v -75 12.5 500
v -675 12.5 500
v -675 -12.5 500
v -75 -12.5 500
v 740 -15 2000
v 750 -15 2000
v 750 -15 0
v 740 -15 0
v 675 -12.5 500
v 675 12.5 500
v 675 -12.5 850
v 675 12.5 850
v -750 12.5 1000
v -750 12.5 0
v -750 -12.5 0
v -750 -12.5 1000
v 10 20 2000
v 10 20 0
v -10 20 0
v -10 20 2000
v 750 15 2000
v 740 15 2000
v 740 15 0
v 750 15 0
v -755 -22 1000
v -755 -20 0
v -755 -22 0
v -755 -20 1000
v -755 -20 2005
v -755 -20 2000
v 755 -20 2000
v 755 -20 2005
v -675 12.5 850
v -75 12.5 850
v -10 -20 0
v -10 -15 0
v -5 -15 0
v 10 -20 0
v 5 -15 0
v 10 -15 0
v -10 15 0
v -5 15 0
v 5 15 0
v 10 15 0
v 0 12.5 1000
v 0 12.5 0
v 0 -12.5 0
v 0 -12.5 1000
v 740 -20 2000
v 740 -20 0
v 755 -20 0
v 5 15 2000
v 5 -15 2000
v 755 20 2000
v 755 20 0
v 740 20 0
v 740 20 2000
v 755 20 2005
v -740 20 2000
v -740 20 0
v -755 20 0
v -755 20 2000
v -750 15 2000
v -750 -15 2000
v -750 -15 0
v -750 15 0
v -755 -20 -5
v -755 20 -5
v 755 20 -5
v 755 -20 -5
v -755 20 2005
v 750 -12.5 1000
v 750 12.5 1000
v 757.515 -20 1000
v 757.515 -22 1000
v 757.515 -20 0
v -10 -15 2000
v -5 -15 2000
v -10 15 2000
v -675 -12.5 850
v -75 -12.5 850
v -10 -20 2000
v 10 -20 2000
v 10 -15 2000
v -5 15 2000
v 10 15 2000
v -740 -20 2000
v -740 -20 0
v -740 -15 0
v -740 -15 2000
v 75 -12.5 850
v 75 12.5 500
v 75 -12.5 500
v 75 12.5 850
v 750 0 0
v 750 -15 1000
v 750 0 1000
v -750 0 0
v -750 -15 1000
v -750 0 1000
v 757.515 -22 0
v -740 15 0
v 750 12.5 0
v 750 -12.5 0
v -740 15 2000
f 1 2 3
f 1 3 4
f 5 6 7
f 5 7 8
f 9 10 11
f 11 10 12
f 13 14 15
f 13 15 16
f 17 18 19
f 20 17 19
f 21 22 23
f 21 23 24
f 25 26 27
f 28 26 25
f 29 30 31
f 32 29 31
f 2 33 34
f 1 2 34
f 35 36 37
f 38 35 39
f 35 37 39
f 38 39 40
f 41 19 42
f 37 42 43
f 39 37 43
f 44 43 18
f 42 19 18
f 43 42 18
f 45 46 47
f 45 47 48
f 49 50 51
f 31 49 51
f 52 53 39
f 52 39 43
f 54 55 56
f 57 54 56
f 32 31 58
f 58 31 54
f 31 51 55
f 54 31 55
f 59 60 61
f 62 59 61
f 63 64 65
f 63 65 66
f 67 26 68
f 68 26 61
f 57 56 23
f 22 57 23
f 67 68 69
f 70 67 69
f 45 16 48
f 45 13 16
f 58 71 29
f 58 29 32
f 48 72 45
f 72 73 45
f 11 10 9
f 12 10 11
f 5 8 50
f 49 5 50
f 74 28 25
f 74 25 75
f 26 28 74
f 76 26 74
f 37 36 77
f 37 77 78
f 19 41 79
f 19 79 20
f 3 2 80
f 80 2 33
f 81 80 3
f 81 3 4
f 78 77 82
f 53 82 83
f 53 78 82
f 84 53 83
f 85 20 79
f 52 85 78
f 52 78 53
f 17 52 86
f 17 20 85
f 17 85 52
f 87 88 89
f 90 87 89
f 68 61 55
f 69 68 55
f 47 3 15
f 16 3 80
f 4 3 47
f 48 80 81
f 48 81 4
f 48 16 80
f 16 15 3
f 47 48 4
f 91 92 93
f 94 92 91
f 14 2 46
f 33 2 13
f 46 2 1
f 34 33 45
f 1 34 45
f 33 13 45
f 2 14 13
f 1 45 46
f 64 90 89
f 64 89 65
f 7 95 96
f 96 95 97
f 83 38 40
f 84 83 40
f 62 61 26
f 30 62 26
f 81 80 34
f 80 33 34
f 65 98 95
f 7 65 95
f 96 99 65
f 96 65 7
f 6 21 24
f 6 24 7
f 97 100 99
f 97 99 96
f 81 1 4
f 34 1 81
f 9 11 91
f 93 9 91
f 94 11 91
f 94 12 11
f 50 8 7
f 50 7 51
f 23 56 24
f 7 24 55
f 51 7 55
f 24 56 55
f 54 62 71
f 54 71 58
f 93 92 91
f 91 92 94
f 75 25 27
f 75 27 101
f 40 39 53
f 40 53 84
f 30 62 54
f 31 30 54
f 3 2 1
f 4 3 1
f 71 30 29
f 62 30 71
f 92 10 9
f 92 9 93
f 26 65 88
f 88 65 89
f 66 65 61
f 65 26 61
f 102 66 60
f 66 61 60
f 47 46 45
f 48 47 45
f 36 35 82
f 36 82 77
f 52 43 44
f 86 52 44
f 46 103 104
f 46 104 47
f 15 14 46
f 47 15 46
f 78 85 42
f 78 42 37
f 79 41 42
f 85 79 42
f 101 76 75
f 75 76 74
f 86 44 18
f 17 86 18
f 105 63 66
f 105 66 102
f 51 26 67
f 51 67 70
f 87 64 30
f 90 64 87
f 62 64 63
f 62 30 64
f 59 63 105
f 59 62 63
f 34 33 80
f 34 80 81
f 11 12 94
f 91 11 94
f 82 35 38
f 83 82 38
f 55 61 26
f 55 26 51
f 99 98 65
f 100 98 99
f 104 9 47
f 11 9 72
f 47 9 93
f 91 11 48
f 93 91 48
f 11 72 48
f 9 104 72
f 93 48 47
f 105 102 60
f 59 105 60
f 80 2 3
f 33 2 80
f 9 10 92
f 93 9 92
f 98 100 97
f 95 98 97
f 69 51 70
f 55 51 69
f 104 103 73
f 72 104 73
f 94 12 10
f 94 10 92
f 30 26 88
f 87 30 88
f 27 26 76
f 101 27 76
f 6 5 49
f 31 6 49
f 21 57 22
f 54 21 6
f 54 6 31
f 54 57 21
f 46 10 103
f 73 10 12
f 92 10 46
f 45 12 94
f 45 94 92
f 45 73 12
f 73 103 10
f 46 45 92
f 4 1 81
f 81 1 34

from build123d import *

# Parameters (mm, degrees)
F1_DEPTH  = 2000
F0_W      = 5
F0_H      = 5
F2_W      = 1500
F2_H      = 1000
F3_DEPTH  = 15
F4_DEPTH  = 15
F5_W      = 1510
F5_H      = 40
F6_DEPTH  = 5
F7_W      = 1510
F7_H      = 40
F8_DEPTH  = 5
F10_DEPTH = 15
F11_W     = 1200
F11_H     = 800
F12_DEPTH = 15
F15_W     = 750
F15_H     = 1000
F15_W_2   = 600
F15_H_2   = 350
F16_DEPTH = 12.5
F18_W     = 600
F18_H     = 350
F19_DEPTH = 25
F21_W     = 1512.5146555901
F21_H     = 1000
F22_DEPTH = 2


with BuildPart() as f1:
    # F0 (on Top) → F1 (new body)
    with BuildSketch(Plane.XY):
        Polygon((-750, -15), (-750, 0), (-750, 15), (-740, 15), (-740, 20), (-755, 20), (-755, 0), (-755, -20), (-740, -20), (-740, -15), align=None)
    extrude(amount=F1_DEPTH)


with BuildPart() as f1b:
    # F0 (on Top) → F1, piece 2 (new body)
    with BuildSketch(Plane.XY):
        Polygon((750, -15), (740, -15), (740, -20), (755, -20), (755, 0), (755, 20), (740, 20), (740, 15), (750, 15), (750, 0), align=None)
    extrude(amount=F1_DEPTH)


with BuildPart() as f1c:
    # F0 (on Top) → F1, piece 3 (new body)
    with BuildSketch(Plane.XY):
        Polygon((5, -15), (0, -15), (-5, -15), (-5, -20), (5, -20), align=None)
        Polygon((-5, -15), (0, -15), (0, 0), (0, 15), (-5, 15), (-5, 0), align=None)
        Polygon((0, 0), (0, -15), (5, -15), (5, 0), (5, 15), (0, 15), align=None)
        with Locations((-7.5, -17.5)):
            Rectangle(F0_W, F0_H)
        with Locations((7.5, -17.5)):
            Rectangle(F0_W, F0_H)
        Polygon((-5, 15), (0, 15), (5, 15), (5, 20), (-5, 20), align=None)
        with Locations((-7.5, 17.5)):
            Rectangle(F0_W, F0_H)
        with Locations((7.5, 17.5)):
            Rectangle(F0_W, F0_H)
    extrude(amount=F1_DEPTH)


with BuildPart() as f3:
    # F2 (on Front) → F3 (new body)
    with BuildSketch(Plane.XZ):
        with Locations((0, 500)):
            Rectangle(F2_W, F2_H)
    extrude(amount=F3_DEPTH)


with BuildPart() as f4:
    # F2 (on Front) → F4 (new body)
    with BuildSketch(Plane.XZ):
        with Locations((0, 500)):
            Rectangle(F2_W, F2_H)
    extrude(amount=-F4_DEPTH)

    # F9 (on face) → F10 (cut)
    with BuildSketch(Plane(origin=(0, 15, 0), x_dir=(-1, 0, 0), z_dir=(0, 1, 0))):
        Polygon((-600, 100), (0, 100), (600, 100), (600, 900), (0, 900), (-600, 900), align=None)
    extrude(amount=-F10_DEPTH, mode=Mode.SUBTRACT)


with BuildPart() as f6:
    # F5 (on face) → F6 (new body)
    with BuildSketch(Plane.XY.offset(2000)):
        Rectangle(F5_W, F5_H)
    extrude(amount=F6_DEPTH)


with BuildPart() as f8:
    # F7 (on face) → F8 (new body)
    with BuildSketch(Plane.XY):
        Rectangle(F7_W, F7_H)
    extrude(amount=-F8_DEPTH)


with BuildPart() as f12:
    # F11 (on face) → F12 (new body)
    with BuildSketch(Plane(origin=(0, 15, 0), x_dir=(-1, 0, 0), z_dir=(0, 1, 0))):
        with Locations((0, 500)):
            Rectangle(F11_W, F11_H)
    extrude(amount=-F12_DEPTH)


with BuildPart() as f16:
    # F15 (on face) → F16 (new body, symmetric)
    with BuildSketch(Plane(origin=(0, 0, 0), x_dir=(-1, 0, 0), z_dir=(0, 1, 0))):
        with Locations((-375, 500)):
            Rectangle(F15_W, F15_H)
        with Locations((-375, 675)):
            Rectangle(F15_W_2, F15_H_2, mode=Mode.SUBTRACT)
    extrude(amount=F16_DEPTH, both=True)


with BuildPart() as f17_1:
    # F17: instance of F16
    add(f16.part.mirror(Plane.YZ))


with BuildPart() as f19:
    # F18 (on face) → F19 (new body, through all)
    with BuildSketch(Plane(origin=(0, 12.5, 0), x_dir=(-1, 0, 0), z_dir=(0, 1, 0))):
        with Locations((-375, 675)):
            Rectangle(F18_W, F18_H)
    extrude(amount=-F19_DEPTH)


with BuildPart() as f20_1:
    # F20: instance of F19
    add(f19.part.mirror(Plane.YZ))


with BuildPart() as f22:
    # F21 (on face) → F22 (new body)
    with BuildSketch(Plane.XZ.offset(20)):
        with Locations((1.257327795, 500)):
            Rectangle(F21_W, F21_H)
    extrude(amount=F22_DEPTH)


solid = Compound([f1.part, f1b.part, f1c.part, f3.part, f6.part, f8.part, f16.part, f17_1.part, f19.part, f20_1.part, f22.part])
